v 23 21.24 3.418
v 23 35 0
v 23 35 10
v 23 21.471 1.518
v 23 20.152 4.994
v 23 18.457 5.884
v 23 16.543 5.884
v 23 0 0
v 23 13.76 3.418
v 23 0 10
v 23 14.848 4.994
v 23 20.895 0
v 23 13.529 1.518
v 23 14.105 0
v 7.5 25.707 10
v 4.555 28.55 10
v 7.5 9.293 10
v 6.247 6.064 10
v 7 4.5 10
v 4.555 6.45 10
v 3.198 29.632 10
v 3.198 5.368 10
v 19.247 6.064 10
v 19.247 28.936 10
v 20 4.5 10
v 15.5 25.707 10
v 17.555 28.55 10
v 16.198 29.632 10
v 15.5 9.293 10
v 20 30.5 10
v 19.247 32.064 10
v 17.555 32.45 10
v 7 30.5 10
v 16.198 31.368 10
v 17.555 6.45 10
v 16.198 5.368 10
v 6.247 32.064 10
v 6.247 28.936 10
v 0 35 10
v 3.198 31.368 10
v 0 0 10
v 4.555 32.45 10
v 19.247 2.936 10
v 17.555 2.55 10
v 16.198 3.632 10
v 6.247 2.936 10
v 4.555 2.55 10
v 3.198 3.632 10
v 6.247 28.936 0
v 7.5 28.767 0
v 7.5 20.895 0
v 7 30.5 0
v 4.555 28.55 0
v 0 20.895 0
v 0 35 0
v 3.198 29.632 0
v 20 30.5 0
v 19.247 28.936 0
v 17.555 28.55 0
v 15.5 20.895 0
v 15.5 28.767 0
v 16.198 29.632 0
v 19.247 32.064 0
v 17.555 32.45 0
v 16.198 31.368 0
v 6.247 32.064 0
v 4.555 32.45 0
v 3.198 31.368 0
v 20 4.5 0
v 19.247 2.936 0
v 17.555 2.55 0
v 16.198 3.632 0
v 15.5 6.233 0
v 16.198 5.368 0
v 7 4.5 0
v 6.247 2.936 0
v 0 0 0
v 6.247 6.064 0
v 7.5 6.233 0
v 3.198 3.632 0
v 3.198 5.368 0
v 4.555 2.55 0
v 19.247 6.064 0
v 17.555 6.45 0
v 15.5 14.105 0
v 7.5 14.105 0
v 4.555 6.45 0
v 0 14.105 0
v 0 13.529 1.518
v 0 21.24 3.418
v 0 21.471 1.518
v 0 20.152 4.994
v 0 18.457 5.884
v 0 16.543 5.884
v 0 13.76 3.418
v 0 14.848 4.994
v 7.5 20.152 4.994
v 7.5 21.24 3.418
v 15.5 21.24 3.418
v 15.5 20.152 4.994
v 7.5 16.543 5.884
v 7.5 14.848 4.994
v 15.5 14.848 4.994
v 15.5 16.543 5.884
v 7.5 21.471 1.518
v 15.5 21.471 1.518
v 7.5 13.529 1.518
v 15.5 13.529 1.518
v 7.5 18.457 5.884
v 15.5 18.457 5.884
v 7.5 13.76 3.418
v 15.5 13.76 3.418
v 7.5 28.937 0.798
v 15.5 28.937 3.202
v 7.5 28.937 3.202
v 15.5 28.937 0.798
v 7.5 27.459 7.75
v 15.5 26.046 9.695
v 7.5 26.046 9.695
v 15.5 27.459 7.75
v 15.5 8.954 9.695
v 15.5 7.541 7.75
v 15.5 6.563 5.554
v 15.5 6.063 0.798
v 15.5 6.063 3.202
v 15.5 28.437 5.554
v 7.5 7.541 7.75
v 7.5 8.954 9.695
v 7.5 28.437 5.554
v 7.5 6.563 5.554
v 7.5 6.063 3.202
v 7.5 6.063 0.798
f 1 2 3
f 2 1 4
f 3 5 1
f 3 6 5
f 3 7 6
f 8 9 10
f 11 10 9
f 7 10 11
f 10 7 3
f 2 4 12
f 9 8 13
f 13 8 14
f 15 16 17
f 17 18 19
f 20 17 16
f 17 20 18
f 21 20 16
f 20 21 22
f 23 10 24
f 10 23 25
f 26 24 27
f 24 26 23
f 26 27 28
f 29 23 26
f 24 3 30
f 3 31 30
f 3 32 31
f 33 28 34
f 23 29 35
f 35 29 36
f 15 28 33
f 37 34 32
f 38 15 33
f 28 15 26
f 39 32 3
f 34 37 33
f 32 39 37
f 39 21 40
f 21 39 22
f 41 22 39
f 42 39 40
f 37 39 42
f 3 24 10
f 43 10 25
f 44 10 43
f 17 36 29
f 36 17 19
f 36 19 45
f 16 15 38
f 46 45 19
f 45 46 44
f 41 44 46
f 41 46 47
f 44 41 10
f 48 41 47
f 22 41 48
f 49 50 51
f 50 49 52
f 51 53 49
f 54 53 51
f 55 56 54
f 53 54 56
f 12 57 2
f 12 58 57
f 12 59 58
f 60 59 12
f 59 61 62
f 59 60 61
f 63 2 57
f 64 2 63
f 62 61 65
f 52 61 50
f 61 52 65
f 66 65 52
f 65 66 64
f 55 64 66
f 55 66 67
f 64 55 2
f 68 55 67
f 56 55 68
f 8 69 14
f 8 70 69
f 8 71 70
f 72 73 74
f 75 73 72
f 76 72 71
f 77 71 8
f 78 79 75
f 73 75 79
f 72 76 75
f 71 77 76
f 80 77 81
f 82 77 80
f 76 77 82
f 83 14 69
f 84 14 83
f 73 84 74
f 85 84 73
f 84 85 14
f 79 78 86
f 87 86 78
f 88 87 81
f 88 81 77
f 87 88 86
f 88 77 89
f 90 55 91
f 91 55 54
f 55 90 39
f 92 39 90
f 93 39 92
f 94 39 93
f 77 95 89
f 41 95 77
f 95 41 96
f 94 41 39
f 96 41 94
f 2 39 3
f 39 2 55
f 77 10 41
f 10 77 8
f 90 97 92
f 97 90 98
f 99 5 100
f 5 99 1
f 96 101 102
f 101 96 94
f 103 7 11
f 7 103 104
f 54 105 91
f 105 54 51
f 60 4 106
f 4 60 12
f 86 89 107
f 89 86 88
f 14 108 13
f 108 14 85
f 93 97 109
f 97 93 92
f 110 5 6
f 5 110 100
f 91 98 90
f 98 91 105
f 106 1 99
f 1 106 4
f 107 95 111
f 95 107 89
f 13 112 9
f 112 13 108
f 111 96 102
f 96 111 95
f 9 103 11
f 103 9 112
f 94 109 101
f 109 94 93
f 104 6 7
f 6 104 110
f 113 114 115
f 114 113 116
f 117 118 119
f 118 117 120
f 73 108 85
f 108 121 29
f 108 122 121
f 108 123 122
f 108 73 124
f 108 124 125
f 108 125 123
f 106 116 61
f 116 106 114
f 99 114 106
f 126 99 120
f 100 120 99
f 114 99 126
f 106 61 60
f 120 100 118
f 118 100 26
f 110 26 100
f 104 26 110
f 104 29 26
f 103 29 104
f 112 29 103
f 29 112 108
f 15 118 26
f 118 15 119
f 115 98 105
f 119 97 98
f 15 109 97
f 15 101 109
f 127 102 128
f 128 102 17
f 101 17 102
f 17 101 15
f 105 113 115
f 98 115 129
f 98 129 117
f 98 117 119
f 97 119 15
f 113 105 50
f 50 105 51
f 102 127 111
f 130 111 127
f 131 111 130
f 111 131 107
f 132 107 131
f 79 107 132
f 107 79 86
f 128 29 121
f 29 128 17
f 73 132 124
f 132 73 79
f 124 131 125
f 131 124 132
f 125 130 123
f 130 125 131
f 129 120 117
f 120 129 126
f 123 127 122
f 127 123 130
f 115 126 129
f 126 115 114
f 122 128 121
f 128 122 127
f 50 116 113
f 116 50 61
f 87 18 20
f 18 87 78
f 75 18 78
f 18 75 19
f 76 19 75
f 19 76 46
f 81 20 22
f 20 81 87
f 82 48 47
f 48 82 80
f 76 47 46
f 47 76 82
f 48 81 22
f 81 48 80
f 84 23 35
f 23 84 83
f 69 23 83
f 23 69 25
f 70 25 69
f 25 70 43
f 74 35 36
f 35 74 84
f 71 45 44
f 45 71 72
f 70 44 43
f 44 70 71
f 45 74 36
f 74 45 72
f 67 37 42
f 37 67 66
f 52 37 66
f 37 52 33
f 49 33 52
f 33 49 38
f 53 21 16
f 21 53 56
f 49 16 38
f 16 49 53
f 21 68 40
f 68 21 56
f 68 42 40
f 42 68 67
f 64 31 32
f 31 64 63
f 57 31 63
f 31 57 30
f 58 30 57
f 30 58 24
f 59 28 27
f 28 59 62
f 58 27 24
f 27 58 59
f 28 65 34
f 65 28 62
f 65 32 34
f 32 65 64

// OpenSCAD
// 
/*
 *  Extruder Idler Block
 *  by Timothy Schmidt.
 *
 *  This program is free software; you can redistribute it and/or modify
 *  it under the terms of the GNU General Public License as published by
 *  the Free Software Foundation; either version 2 of the License, or
 *  (at your option) any later version.
 *
 *  This program is distributed in the hope that it will be useful,
 *  but WITHOUT ANY WARRANTY; without even the implied warranty of
 *  MERCHANTABILITY or FITNESS FOR A PARTICULAR PURPOSE.  See the
 *  GNU General Public License for more details.
 *
 *  You should have received a copy of the GNU General Public License
 *  along with this program; if not, write to the Free Software
 *  Foundation, Inc., 59 Temple Place, Suite 330, Boston, MA  02111-1307  USA
 *
*/

difference () {
	cube(size=[23,35,10]);
	translate(v=[-1,17.5,2]) rotate([0,90,0]) cylinder(r=4, h=25);
	translate(v=[7.5,17.5,2]) rotate([0,90,0]) cylinder(r=11.5, h=8);
	translate(v=[5,4.5,-1]) cylinder(r=2,h=12);
	translate(v=[18,4.5,-1]) cylinder(r=2,h=12);
	translate(v=[5,30.5,-1]) cylinder(r=2,h=12);
	translate(v=[18,30.5,-1]) cylinder(r=2,h=12);
}
